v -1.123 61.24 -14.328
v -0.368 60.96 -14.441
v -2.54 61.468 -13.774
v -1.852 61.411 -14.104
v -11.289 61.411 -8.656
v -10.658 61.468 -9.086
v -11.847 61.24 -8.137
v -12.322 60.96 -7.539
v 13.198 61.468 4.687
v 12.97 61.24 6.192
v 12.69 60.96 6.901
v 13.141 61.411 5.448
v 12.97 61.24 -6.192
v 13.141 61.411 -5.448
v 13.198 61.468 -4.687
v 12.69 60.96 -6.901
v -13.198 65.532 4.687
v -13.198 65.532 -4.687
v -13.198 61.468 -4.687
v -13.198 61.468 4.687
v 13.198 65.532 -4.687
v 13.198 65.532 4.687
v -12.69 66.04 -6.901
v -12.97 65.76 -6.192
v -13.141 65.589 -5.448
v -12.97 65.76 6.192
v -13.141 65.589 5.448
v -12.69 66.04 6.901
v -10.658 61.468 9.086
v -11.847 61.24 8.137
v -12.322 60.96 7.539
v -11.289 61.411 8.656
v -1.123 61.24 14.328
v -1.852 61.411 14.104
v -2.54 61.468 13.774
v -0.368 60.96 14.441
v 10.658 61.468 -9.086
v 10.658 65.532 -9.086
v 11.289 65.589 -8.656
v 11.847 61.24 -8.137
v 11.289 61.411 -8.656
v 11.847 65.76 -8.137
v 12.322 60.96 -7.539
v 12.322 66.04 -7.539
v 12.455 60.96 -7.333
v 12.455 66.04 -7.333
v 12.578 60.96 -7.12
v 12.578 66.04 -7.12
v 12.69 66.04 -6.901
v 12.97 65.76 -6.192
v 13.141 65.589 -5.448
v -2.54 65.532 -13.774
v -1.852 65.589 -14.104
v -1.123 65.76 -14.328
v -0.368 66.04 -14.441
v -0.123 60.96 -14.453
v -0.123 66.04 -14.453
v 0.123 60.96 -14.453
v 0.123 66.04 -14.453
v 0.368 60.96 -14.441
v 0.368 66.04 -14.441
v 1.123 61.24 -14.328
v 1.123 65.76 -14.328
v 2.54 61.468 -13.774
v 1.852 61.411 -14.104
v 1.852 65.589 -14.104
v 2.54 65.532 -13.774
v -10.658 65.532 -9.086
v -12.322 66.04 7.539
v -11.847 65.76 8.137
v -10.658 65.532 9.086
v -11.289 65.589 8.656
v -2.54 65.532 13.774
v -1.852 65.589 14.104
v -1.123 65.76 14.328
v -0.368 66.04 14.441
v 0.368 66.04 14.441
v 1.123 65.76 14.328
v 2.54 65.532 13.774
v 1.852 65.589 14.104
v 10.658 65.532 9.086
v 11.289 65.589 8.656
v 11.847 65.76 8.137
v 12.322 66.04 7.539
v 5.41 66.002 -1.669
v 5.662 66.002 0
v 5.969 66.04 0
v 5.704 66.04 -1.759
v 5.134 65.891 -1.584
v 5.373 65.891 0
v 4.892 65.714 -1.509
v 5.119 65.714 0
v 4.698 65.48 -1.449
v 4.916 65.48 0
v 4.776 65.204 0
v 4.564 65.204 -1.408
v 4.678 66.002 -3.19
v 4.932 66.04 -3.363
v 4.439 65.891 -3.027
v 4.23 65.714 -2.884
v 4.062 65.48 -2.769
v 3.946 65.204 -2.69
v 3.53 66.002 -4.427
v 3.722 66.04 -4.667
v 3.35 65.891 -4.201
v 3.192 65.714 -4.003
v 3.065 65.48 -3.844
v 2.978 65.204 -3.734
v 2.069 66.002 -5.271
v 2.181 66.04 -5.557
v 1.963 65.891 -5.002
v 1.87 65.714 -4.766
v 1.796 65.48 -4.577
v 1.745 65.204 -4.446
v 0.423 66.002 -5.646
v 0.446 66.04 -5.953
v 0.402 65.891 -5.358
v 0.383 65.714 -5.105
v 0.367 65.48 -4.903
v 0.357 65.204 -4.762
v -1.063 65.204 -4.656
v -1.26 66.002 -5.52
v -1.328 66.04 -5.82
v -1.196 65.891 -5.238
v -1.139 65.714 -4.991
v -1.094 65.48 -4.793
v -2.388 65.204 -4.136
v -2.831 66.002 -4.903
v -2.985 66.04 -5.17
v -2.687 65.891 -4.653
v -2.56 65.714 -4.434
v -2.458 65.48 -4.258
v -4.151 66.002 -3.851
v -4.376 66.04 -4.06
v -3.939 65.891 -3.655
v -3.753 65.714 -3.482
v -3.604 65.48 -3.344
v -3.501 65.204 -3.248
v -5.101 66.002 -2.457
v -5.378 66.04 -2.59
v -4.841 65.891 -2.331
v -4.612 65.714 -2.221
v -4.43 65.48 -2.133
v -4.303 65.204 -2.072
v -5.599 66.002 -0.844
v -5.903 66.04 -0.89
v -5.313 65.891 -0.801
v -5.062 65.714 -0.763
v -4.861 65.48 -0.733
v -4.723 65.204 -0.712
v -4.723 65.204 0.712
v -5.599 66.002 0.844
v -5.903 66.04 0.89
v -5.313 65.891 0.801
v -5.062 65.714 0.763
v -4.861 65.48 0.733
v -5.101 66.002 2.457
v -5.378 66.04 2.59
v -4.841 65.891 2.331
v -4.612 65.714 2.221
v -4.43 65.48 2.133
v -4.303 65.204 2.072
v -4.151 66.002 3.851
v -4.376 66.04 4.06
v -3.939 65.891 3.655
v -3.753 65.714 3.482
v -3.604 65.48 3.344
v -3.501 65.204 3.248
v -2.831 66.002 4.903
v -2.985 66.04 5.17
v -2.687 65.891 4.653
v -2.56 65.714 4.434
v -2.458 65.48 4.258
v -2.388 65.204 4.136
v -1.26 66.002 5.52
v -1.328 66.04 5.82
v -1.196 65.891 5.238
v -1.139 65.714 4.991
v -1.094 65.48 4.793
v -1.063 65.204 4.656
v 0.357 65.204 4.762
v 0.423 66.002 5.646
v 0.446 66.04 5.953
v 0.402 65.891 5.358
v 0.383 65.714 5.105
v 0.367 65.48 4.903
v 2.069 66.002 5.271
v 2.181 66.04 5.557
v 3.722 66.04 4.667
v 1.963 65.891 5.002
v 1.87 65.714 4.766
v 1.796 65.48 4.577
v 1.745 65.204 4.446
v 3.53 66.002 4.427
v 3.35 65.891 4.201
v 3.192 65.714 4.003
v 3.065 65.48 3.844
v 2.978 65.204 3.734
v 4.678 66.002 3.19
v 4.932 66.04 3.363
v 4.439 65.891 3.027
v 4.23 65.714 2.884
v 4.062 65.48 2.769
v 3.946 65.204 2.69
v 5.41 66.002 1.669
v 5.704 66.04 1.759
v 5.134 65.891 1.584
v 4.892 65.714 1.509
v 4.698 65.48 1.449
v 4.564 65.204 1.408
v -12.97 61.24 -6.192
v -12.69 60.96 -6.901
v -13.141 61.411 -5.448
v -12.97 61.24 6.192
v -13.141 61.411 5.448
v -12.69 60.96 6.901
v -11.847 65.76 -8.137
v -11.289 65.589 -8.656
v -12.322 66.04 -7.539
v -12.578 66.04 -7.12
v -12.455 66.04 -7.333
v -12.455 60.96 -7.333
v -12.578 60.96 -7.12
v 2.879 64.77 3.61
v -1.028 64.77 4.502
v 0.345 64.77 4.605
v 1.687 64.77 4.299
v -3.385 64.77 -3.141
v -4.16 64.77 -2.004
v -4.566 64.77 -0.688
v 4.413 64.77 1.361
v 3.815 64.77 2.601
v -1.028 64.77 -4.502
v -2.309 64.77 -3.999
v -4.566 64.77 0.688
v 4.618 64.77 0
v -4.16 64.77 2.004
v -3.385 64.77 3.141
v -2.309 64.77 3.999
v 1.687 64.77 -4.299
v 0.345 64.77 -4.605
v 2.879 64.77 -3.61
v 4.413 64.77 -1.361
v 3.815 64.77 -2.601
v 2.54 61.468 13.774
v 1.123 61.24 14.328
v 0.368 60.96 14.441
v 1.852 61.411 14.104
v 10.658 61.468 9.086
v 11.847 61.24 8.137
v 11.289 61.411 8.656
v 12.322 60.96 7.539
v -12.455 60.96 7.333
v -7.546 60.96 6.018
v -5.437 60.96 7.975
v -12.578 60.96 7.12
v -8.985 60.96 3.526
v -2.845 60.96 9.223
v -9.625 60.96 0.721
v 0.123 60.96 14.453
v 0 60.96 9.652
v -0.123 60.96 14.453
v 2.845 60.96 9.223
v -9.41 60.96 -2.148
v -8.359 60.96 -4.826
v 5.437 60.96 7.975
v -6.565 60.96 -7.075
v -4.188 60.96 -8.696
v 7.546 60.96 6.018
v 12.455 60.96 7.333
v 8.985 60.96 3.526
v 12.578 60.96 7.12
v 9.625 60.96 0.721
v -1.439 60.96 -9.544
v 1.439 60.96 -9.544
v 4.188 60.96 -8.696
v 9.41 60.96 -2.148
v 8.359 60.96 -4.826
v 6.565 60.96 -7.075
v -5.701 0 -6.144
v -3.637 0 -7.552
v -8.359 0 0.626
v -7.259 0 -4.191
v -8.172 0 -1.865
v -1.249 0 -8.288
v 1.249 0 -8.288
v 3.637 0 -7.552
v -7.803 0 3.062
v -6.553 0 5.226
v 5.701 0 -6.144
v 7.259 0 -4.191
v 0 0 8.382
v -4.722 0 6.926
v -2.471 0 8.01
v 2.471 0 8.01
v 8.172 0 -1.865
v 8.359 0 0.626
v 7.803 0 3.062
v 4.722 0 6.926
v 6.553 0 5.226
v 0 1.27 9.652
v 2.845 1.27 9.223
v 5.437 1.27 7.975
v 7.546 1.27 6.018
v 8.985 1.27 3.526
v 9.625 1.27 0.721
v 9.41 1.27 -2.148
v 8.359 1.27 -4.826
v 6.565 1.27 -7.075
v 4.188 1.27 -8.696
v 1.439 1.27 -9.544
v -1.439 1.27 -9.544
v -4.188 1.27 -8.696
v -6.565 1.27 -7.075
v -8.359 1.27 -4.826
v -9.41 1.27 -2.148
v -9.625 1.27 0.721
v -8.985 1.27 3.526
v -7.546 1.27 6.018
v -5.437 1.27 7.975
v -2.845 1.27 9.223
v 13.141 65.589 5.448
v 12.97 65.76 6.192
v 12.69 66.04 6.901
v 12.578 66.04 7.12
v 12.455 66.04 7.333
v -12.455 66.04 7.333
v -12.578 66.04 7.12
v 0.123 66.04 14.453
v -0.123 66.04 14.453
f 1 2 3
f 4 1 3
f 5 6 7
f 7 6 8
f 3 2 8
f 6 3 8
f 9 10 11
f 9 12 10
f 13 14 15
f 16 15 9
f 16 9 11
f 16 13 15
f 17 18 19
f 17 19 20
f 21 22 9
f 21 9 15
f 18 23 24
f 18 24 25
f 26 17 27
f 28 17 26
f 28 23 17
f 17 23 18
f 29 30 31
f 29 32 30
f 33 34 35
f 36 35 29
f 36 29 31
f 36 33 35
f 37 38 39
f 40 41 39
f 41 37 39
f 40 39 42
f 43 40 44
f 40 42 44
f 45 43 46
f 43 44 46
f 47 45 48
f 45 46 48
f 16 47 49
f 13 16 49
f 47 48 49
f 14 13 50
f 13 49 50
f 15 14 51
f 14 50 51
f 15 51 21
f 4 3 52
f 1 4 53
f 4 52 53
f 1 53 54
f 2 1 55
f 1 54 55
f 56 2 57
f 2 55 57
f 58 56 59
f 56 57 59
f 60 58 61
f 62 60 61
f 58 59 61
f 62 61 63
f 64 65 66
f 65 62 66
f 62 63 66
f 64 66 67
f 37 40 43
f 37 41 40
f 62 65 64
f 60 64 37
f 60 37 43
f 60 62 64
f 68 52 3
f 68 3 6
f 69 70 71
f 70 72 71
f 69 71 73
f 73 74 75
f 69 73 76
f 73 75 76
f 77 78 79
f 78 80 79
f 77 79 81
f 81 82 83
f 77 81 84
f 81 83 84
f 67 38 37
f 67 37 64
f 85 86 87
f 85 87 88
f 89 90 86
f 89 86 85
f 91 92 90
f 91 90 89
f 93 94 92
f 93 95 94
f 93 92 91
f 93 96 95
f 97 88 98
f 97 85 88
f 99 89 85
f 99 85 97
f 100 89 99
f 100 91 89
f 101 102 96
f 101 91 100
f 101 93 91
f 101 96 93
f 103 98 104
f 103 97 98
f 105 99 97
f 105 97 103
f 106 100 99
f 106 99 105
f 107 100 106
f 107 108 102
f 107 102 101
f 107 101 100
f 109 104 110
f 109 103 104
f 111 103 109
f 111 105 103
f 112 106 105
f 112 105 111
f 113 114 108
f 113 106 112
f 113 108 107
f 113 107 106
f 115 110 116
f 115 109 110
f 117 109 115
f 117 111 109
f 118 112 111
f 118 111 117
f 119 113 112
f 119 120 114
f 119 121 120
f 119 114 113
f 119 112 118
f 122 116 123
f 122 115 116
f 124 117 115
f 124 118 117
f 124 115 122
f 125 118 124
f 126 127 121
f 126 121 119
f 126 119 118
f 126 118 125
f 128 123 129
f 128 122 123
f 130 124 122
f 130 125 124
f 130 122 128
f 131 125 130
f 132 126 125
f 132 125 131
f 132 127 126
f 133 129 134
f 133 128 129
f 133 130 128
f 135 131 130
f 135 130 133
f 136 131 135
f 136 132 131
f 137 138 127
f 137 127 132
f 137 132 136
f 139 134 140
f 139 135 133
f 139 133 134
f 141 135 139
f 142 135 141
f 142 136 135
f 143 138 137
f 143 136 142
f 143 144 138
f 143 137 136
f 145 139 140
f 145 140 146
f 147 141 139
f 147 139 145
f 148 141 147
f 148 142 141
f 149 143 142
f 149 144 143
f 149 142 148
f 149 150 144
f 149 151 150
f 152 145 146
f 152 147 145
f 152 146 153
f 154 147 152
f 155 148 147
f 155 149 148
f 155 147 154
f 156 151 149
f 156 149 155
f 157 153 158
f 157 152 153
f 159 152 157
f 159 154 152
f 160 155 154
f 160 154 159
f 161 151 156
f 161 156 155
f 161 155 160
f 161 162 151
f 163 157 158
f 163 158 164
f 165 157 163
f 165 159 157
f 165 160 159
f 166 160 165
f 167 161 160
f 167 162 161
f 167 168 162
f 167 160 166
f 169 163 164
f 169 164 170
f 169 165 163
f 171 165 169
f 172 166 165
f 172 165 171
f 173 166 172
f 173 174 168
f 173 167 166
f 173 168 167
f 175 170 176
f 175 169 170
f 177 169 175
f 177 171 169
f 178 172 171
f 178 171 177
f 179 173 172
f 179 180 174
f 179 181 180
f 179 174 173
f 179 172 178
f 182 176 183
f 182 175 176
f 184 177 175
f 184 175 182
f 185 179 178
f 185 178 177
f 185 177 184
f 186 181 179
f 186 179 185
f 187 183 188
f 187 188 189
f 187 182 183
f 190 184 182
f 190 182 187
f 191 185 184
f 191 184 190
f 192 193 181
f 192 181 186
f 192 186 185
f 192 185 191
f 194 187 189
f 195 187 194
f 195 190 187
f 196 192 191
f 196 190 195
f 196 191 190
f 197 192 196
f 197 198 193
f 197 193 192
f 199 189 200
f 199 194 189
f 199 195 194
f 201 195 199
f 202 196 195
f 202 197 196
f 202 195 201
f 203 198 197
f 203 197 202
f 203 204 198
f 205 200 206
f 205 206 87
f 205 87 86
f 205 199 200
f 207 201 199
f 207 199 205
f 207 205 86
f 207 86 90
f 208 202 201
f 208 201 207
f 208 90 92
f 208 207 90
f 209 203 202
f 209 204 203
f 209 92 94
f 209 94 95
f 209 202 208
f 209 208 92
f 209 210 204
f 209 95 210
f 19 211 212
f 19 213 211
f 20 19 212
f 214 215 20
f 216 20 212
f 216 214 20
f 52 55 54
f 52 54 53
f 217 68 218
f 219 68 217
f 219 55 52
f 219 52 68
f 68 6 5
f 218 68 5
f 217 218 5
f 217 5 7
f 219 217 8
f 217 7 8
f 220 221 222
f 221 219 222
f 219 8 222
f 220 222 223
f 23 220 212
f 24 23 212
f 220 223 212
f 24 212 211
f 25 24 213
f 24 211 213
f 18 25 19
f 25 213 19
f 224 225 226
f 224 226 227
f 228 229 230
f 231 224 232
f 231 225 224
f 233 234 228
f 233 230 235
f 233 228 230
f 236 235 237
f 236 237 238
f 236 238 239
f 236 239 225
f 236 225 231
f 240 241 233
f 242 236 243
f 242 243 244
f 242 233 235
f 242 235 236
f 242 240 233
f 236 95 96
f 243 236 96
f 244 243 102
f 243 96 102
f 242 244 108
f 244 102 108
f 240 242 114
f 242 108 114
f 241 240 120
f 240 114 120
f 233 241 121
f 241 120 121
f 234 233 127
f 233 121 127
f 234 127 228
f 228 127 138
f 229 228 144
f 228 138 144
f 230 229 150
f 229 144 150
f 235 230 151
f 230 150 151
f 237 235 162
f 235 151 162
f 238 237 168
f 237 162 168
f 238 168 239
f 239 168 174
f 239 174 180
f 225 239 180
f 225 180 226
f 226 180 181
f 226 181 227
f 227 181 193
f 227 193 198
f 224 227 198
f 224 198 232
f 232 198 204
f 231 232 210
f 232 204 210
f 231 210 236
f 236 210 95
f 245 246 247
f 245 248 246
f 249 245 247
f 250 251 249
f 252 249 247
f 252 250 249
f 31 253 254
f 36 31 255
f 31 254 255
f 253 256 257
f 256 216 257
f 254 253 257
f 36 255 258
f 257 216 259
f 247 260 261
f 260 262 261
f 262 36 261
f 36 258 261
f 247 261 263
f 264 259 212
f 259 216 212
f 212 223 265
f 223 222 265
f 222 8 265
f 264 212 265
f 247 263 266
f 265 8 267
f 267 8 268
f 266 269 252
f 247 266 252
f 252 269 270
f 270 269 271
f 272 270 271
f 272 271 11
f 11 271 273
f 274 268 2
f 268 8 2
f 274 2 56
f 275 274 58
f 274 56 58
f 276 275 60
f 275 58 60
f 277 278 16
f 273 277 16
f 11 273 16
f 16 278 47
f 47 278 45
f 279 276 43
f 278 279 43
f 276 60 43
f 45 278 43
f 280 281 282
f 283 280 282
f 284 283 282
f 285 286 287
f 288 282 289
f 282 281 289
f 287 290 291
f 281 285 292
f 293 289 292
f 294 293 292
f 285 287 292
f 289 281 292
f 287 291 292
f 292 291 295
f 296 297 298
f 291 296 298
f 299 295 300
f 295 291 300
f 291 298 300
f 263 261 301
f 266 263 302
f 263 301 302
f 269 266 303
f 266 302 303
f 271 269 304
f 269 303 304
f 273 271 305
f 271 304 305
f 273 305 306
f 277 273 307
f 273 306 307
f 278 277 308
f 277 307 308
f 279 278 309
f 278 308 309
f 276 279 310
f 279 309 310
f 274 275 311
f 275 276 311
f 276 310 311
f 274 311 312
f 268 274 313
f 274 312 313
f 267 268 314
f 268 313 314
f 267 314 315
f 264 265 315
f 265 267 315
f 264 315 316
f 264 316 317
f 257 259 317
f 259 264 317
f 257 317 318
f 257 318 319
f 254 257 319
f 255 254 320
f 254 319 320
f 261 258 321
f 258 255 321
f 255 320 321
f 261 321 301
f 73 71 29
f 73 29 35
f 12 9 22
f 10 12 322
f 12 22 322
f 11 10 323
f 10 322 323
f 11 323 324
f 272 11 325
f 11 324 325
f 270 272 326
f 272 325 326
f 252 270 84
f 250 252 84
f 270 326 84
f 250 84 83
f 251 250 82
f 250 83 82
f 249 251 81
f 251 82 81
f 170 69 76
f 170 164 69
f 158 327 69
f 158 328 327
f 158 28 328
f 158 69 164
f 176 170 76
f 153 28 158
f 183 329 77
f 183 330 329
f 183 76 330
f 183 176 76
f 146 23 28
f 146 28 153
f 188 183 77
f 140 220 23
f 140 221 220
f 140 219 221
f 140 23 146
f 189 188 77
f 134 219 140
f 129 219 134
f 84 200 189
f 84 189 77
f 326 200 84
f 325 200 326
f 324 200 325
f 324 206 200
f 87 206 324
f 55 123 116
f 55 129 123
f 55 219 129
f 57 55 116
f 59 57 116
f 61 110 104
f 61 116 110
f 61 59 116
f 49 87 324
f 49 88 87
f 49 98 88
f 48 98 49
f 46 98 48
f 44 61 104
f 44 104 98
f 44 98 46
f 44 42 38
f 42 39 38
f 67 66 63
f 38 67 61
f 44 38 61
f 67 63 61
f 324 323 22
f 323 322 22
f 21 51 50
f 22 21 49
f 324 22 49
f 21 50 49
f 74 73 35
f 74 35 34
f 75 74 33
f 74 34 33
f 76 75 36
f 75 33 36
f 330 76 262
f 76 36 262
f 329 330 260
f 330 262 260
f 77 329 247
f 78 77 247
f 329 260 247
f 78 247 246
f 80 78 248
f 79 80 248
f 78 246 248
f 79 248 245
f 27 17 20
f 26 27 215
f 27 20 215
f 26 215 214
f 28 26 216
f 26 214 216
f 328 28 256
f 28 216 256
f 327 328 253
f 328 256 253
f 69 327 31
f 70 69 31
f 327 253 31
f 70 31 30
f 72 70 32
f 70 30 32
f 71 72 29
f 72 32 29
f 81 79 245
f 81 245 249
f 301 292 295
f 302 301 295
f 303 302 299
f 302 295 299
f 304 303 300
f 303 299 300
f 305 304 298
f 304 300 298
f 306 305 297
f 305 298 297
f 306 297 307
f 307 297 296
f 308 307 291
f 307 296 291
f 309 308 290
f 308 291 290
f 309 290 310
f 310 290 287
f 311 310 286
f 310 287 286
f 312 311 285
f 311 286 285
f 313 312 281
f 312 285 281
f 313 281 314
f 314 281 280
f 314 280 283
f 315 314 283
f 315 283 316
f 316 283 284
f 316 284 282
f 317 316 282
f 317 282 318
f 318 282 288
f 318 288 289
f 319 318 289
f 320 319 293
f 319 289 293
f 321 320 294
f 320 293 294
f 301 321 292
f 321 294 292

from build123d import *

# Parameters (mm, degrees)
SKETCH2_R           = 9.652
BOSS_EXTRUDE1_DEPTH = 63.5
CHAMFER1_SIZE       = 1.27
BOSS_EXTRUDE2_DEPTH = 2.54
CHAMFER2_SIZE       = 0.508
FILLET1_R           = 5.08
SKETCH7_R           = 5.08
CUT_EXTRUDE1_DEPTH  = 1.27
CUT_EXTRUDE1_DRAFT  = -20
FILLET2_R           = 1.27


with BuildPart() as part:
    # Sketch2 → Boss-Extrude1 (new body)
    with BuildSketch(Plane(origin=(0, 0, 0), x_dir=(1, 0, 0), z_dir=(0, 1, 0))):
        with Locations(Location((0, 0, 0), (0, 0, 270))):
            Circle(SKETCH2_R)
    extrude(amount=BOSS_EXTRUDE1_DEPTH)

    # Chamfer1
    chamfer1_edges = [part.edges().sort_by_distance(p)[0] for p in [
        (0, 0, -9.652),
    ]]
    chamfer(chamfer1_edges, length=CHAMFER1_SIZE)

    # Sketch6 → Boss-Extrude2 (add, symmetric)
    with BuildSketch(Plane(origin=(0, 63.5, 0), x_dir=(1, 0, 0), z_dir=(0, 1, 0))):
        Polygon((0, 15.24), (-13.198227154, 7.62), (-13.198227154, -7.62), (0, -15.24), (13.198227154, -7.62), (13.198227154, 7.62), align=None)
    extrude(amount=BOSS_EXTRUDE2_DEPTH, both=True)

    # Chamfer2
    chamfer2_edges = [part.edges().sort_by_distance(p)[0] for p in [
        (-13.198227154, 60.96, 0),
        (-6.599113577, 60.96, 11.43),
        (6.599113577, 60.96, 11.43),
        (13.198227154, 60.96, 0),
        (6.599113577, 66.04, -11.43),
        (-6.599113577, 66.04, -11.43),
        (-13.198227154, 66.04, 0),
        (-6.599113577, 66.04, 11.43),
        (6.599113577, 66.04, 11.43),
        (13.198227154, 66.04, 0),
        (6.599113577, 60.96, -11.43),
        (-6.599113577, 60.96, -11.43),
    ]]
    chamfer(chamfer2_edges, length=CHAMFER2_SIZE)

    # Fillet1
    # the kernel refuses this fillet: 5.08 mm, written as the material it takes off along each edge
    with BuildSketch(Plane(origin=(-13.198227154, 54.135651581, -7.62), x_dir=(0, 0, 1), z_dir=(0, 1, 0)), Plane(origin=(13.198227154, 72.864348419, 7.62), x_dir=(-0.8660254037844387, 0, 0.5), z_dir=(0, -1, 0))) as fillet1_piece_1:
        with BuildLine():
            CenterArc((FILLET1_R * 0.57735026919, FILLET1_R), FILLET1_R, 210, 60)
            Line((-FILLET1_R * 0.288675134595, FILLET1_R * 0.5), (0, 0))
            Line((0, 0), (FILLET1_R * 0.57735026919, 0))
        make_face()
    extrude(amount=18.728696837, mode=Mode.SUBTRACT)
    with BuildSketch(Plane(origin=(-13.198227154, 54.135651581, 7.62), x_dir=(0, 0, -1), z_dir=(0, 1, 0)), Plane(origin=(0, 72.864348419, -15.24), x_dir=(-0.8660254037844386, 0, 0.5), z_dir=(0, -1, 0)), Plane(origin=(13.198227154, 72.864348419, -7.62), x_dir=(-0.8660254037844388, 0, -0.4999999999999998), z_dir=(0, -1, 0)), Plane(origin=(0, 54.135651581, 15.24), x_dir=(-0.8660254037844386, 0, -0.5000000000000001), z_dir=(0, 1, 0))) as fillet1_piece_2:
        with BuildLine():
            CenterArc((FILLET1_R * 0.57735026919, -FILLET1_R), FILLET1_R, 90, 60)
            Line((-FILLET1_R * 0.288675134595, -FILLET1_R * 0.5), (0, 0))
            Line((0, 0), (FILLET1_R * 0.57735026919, 0))
        make_face()
    extrude(amount=18.728696837, mode=Mode.SUBTRACT)


with BuildPart() as cut_extrude1_tool:
    # Sketch7 → Cut-Extrude1 (with draft: the straight prism first)
    with BuildSketch(Plane(origin=(0, 66.04, 0), x_dir=(1, 0, 0), z_dir=(0, 1, 0))):
        Circle(SKETCH7_R)
    extrude(amount=-CUT_EXTRUDE1_DEPTH)
    # Cut-Extrude1: the draft: its side faces are tilted about the plane it starts from
    cut_extrude1_sides = [cut_extrude1_tool.faces().sort_by_distance(p)[0] for p in [
        (-5.08, 65.405, 0),
    ]]
    draft(cut_extrude1_sides, Plane(origin=(0, 66.04, 0), x_dir=(1, 0, 0), z_dir=(0, 1, 0)), CUT_EXTRUDE1_DRAFT)


with BuildPart() as part_1:
    add(part.part)

    # Cut-Extrude1: cut by cut_extrude1_tool
    add(cut_extrude1_tool.part, mode=Mode.SUBTRACT)

    # Fillet2
    fillet2_edges = [part_1.edges().sort_by_distance(p)[0] for p in [
        (-5.08, 66.04, 0),
    ]]
    fillet(fillet2_edges, radius=FILLET2_R)


solid = part_1.part
